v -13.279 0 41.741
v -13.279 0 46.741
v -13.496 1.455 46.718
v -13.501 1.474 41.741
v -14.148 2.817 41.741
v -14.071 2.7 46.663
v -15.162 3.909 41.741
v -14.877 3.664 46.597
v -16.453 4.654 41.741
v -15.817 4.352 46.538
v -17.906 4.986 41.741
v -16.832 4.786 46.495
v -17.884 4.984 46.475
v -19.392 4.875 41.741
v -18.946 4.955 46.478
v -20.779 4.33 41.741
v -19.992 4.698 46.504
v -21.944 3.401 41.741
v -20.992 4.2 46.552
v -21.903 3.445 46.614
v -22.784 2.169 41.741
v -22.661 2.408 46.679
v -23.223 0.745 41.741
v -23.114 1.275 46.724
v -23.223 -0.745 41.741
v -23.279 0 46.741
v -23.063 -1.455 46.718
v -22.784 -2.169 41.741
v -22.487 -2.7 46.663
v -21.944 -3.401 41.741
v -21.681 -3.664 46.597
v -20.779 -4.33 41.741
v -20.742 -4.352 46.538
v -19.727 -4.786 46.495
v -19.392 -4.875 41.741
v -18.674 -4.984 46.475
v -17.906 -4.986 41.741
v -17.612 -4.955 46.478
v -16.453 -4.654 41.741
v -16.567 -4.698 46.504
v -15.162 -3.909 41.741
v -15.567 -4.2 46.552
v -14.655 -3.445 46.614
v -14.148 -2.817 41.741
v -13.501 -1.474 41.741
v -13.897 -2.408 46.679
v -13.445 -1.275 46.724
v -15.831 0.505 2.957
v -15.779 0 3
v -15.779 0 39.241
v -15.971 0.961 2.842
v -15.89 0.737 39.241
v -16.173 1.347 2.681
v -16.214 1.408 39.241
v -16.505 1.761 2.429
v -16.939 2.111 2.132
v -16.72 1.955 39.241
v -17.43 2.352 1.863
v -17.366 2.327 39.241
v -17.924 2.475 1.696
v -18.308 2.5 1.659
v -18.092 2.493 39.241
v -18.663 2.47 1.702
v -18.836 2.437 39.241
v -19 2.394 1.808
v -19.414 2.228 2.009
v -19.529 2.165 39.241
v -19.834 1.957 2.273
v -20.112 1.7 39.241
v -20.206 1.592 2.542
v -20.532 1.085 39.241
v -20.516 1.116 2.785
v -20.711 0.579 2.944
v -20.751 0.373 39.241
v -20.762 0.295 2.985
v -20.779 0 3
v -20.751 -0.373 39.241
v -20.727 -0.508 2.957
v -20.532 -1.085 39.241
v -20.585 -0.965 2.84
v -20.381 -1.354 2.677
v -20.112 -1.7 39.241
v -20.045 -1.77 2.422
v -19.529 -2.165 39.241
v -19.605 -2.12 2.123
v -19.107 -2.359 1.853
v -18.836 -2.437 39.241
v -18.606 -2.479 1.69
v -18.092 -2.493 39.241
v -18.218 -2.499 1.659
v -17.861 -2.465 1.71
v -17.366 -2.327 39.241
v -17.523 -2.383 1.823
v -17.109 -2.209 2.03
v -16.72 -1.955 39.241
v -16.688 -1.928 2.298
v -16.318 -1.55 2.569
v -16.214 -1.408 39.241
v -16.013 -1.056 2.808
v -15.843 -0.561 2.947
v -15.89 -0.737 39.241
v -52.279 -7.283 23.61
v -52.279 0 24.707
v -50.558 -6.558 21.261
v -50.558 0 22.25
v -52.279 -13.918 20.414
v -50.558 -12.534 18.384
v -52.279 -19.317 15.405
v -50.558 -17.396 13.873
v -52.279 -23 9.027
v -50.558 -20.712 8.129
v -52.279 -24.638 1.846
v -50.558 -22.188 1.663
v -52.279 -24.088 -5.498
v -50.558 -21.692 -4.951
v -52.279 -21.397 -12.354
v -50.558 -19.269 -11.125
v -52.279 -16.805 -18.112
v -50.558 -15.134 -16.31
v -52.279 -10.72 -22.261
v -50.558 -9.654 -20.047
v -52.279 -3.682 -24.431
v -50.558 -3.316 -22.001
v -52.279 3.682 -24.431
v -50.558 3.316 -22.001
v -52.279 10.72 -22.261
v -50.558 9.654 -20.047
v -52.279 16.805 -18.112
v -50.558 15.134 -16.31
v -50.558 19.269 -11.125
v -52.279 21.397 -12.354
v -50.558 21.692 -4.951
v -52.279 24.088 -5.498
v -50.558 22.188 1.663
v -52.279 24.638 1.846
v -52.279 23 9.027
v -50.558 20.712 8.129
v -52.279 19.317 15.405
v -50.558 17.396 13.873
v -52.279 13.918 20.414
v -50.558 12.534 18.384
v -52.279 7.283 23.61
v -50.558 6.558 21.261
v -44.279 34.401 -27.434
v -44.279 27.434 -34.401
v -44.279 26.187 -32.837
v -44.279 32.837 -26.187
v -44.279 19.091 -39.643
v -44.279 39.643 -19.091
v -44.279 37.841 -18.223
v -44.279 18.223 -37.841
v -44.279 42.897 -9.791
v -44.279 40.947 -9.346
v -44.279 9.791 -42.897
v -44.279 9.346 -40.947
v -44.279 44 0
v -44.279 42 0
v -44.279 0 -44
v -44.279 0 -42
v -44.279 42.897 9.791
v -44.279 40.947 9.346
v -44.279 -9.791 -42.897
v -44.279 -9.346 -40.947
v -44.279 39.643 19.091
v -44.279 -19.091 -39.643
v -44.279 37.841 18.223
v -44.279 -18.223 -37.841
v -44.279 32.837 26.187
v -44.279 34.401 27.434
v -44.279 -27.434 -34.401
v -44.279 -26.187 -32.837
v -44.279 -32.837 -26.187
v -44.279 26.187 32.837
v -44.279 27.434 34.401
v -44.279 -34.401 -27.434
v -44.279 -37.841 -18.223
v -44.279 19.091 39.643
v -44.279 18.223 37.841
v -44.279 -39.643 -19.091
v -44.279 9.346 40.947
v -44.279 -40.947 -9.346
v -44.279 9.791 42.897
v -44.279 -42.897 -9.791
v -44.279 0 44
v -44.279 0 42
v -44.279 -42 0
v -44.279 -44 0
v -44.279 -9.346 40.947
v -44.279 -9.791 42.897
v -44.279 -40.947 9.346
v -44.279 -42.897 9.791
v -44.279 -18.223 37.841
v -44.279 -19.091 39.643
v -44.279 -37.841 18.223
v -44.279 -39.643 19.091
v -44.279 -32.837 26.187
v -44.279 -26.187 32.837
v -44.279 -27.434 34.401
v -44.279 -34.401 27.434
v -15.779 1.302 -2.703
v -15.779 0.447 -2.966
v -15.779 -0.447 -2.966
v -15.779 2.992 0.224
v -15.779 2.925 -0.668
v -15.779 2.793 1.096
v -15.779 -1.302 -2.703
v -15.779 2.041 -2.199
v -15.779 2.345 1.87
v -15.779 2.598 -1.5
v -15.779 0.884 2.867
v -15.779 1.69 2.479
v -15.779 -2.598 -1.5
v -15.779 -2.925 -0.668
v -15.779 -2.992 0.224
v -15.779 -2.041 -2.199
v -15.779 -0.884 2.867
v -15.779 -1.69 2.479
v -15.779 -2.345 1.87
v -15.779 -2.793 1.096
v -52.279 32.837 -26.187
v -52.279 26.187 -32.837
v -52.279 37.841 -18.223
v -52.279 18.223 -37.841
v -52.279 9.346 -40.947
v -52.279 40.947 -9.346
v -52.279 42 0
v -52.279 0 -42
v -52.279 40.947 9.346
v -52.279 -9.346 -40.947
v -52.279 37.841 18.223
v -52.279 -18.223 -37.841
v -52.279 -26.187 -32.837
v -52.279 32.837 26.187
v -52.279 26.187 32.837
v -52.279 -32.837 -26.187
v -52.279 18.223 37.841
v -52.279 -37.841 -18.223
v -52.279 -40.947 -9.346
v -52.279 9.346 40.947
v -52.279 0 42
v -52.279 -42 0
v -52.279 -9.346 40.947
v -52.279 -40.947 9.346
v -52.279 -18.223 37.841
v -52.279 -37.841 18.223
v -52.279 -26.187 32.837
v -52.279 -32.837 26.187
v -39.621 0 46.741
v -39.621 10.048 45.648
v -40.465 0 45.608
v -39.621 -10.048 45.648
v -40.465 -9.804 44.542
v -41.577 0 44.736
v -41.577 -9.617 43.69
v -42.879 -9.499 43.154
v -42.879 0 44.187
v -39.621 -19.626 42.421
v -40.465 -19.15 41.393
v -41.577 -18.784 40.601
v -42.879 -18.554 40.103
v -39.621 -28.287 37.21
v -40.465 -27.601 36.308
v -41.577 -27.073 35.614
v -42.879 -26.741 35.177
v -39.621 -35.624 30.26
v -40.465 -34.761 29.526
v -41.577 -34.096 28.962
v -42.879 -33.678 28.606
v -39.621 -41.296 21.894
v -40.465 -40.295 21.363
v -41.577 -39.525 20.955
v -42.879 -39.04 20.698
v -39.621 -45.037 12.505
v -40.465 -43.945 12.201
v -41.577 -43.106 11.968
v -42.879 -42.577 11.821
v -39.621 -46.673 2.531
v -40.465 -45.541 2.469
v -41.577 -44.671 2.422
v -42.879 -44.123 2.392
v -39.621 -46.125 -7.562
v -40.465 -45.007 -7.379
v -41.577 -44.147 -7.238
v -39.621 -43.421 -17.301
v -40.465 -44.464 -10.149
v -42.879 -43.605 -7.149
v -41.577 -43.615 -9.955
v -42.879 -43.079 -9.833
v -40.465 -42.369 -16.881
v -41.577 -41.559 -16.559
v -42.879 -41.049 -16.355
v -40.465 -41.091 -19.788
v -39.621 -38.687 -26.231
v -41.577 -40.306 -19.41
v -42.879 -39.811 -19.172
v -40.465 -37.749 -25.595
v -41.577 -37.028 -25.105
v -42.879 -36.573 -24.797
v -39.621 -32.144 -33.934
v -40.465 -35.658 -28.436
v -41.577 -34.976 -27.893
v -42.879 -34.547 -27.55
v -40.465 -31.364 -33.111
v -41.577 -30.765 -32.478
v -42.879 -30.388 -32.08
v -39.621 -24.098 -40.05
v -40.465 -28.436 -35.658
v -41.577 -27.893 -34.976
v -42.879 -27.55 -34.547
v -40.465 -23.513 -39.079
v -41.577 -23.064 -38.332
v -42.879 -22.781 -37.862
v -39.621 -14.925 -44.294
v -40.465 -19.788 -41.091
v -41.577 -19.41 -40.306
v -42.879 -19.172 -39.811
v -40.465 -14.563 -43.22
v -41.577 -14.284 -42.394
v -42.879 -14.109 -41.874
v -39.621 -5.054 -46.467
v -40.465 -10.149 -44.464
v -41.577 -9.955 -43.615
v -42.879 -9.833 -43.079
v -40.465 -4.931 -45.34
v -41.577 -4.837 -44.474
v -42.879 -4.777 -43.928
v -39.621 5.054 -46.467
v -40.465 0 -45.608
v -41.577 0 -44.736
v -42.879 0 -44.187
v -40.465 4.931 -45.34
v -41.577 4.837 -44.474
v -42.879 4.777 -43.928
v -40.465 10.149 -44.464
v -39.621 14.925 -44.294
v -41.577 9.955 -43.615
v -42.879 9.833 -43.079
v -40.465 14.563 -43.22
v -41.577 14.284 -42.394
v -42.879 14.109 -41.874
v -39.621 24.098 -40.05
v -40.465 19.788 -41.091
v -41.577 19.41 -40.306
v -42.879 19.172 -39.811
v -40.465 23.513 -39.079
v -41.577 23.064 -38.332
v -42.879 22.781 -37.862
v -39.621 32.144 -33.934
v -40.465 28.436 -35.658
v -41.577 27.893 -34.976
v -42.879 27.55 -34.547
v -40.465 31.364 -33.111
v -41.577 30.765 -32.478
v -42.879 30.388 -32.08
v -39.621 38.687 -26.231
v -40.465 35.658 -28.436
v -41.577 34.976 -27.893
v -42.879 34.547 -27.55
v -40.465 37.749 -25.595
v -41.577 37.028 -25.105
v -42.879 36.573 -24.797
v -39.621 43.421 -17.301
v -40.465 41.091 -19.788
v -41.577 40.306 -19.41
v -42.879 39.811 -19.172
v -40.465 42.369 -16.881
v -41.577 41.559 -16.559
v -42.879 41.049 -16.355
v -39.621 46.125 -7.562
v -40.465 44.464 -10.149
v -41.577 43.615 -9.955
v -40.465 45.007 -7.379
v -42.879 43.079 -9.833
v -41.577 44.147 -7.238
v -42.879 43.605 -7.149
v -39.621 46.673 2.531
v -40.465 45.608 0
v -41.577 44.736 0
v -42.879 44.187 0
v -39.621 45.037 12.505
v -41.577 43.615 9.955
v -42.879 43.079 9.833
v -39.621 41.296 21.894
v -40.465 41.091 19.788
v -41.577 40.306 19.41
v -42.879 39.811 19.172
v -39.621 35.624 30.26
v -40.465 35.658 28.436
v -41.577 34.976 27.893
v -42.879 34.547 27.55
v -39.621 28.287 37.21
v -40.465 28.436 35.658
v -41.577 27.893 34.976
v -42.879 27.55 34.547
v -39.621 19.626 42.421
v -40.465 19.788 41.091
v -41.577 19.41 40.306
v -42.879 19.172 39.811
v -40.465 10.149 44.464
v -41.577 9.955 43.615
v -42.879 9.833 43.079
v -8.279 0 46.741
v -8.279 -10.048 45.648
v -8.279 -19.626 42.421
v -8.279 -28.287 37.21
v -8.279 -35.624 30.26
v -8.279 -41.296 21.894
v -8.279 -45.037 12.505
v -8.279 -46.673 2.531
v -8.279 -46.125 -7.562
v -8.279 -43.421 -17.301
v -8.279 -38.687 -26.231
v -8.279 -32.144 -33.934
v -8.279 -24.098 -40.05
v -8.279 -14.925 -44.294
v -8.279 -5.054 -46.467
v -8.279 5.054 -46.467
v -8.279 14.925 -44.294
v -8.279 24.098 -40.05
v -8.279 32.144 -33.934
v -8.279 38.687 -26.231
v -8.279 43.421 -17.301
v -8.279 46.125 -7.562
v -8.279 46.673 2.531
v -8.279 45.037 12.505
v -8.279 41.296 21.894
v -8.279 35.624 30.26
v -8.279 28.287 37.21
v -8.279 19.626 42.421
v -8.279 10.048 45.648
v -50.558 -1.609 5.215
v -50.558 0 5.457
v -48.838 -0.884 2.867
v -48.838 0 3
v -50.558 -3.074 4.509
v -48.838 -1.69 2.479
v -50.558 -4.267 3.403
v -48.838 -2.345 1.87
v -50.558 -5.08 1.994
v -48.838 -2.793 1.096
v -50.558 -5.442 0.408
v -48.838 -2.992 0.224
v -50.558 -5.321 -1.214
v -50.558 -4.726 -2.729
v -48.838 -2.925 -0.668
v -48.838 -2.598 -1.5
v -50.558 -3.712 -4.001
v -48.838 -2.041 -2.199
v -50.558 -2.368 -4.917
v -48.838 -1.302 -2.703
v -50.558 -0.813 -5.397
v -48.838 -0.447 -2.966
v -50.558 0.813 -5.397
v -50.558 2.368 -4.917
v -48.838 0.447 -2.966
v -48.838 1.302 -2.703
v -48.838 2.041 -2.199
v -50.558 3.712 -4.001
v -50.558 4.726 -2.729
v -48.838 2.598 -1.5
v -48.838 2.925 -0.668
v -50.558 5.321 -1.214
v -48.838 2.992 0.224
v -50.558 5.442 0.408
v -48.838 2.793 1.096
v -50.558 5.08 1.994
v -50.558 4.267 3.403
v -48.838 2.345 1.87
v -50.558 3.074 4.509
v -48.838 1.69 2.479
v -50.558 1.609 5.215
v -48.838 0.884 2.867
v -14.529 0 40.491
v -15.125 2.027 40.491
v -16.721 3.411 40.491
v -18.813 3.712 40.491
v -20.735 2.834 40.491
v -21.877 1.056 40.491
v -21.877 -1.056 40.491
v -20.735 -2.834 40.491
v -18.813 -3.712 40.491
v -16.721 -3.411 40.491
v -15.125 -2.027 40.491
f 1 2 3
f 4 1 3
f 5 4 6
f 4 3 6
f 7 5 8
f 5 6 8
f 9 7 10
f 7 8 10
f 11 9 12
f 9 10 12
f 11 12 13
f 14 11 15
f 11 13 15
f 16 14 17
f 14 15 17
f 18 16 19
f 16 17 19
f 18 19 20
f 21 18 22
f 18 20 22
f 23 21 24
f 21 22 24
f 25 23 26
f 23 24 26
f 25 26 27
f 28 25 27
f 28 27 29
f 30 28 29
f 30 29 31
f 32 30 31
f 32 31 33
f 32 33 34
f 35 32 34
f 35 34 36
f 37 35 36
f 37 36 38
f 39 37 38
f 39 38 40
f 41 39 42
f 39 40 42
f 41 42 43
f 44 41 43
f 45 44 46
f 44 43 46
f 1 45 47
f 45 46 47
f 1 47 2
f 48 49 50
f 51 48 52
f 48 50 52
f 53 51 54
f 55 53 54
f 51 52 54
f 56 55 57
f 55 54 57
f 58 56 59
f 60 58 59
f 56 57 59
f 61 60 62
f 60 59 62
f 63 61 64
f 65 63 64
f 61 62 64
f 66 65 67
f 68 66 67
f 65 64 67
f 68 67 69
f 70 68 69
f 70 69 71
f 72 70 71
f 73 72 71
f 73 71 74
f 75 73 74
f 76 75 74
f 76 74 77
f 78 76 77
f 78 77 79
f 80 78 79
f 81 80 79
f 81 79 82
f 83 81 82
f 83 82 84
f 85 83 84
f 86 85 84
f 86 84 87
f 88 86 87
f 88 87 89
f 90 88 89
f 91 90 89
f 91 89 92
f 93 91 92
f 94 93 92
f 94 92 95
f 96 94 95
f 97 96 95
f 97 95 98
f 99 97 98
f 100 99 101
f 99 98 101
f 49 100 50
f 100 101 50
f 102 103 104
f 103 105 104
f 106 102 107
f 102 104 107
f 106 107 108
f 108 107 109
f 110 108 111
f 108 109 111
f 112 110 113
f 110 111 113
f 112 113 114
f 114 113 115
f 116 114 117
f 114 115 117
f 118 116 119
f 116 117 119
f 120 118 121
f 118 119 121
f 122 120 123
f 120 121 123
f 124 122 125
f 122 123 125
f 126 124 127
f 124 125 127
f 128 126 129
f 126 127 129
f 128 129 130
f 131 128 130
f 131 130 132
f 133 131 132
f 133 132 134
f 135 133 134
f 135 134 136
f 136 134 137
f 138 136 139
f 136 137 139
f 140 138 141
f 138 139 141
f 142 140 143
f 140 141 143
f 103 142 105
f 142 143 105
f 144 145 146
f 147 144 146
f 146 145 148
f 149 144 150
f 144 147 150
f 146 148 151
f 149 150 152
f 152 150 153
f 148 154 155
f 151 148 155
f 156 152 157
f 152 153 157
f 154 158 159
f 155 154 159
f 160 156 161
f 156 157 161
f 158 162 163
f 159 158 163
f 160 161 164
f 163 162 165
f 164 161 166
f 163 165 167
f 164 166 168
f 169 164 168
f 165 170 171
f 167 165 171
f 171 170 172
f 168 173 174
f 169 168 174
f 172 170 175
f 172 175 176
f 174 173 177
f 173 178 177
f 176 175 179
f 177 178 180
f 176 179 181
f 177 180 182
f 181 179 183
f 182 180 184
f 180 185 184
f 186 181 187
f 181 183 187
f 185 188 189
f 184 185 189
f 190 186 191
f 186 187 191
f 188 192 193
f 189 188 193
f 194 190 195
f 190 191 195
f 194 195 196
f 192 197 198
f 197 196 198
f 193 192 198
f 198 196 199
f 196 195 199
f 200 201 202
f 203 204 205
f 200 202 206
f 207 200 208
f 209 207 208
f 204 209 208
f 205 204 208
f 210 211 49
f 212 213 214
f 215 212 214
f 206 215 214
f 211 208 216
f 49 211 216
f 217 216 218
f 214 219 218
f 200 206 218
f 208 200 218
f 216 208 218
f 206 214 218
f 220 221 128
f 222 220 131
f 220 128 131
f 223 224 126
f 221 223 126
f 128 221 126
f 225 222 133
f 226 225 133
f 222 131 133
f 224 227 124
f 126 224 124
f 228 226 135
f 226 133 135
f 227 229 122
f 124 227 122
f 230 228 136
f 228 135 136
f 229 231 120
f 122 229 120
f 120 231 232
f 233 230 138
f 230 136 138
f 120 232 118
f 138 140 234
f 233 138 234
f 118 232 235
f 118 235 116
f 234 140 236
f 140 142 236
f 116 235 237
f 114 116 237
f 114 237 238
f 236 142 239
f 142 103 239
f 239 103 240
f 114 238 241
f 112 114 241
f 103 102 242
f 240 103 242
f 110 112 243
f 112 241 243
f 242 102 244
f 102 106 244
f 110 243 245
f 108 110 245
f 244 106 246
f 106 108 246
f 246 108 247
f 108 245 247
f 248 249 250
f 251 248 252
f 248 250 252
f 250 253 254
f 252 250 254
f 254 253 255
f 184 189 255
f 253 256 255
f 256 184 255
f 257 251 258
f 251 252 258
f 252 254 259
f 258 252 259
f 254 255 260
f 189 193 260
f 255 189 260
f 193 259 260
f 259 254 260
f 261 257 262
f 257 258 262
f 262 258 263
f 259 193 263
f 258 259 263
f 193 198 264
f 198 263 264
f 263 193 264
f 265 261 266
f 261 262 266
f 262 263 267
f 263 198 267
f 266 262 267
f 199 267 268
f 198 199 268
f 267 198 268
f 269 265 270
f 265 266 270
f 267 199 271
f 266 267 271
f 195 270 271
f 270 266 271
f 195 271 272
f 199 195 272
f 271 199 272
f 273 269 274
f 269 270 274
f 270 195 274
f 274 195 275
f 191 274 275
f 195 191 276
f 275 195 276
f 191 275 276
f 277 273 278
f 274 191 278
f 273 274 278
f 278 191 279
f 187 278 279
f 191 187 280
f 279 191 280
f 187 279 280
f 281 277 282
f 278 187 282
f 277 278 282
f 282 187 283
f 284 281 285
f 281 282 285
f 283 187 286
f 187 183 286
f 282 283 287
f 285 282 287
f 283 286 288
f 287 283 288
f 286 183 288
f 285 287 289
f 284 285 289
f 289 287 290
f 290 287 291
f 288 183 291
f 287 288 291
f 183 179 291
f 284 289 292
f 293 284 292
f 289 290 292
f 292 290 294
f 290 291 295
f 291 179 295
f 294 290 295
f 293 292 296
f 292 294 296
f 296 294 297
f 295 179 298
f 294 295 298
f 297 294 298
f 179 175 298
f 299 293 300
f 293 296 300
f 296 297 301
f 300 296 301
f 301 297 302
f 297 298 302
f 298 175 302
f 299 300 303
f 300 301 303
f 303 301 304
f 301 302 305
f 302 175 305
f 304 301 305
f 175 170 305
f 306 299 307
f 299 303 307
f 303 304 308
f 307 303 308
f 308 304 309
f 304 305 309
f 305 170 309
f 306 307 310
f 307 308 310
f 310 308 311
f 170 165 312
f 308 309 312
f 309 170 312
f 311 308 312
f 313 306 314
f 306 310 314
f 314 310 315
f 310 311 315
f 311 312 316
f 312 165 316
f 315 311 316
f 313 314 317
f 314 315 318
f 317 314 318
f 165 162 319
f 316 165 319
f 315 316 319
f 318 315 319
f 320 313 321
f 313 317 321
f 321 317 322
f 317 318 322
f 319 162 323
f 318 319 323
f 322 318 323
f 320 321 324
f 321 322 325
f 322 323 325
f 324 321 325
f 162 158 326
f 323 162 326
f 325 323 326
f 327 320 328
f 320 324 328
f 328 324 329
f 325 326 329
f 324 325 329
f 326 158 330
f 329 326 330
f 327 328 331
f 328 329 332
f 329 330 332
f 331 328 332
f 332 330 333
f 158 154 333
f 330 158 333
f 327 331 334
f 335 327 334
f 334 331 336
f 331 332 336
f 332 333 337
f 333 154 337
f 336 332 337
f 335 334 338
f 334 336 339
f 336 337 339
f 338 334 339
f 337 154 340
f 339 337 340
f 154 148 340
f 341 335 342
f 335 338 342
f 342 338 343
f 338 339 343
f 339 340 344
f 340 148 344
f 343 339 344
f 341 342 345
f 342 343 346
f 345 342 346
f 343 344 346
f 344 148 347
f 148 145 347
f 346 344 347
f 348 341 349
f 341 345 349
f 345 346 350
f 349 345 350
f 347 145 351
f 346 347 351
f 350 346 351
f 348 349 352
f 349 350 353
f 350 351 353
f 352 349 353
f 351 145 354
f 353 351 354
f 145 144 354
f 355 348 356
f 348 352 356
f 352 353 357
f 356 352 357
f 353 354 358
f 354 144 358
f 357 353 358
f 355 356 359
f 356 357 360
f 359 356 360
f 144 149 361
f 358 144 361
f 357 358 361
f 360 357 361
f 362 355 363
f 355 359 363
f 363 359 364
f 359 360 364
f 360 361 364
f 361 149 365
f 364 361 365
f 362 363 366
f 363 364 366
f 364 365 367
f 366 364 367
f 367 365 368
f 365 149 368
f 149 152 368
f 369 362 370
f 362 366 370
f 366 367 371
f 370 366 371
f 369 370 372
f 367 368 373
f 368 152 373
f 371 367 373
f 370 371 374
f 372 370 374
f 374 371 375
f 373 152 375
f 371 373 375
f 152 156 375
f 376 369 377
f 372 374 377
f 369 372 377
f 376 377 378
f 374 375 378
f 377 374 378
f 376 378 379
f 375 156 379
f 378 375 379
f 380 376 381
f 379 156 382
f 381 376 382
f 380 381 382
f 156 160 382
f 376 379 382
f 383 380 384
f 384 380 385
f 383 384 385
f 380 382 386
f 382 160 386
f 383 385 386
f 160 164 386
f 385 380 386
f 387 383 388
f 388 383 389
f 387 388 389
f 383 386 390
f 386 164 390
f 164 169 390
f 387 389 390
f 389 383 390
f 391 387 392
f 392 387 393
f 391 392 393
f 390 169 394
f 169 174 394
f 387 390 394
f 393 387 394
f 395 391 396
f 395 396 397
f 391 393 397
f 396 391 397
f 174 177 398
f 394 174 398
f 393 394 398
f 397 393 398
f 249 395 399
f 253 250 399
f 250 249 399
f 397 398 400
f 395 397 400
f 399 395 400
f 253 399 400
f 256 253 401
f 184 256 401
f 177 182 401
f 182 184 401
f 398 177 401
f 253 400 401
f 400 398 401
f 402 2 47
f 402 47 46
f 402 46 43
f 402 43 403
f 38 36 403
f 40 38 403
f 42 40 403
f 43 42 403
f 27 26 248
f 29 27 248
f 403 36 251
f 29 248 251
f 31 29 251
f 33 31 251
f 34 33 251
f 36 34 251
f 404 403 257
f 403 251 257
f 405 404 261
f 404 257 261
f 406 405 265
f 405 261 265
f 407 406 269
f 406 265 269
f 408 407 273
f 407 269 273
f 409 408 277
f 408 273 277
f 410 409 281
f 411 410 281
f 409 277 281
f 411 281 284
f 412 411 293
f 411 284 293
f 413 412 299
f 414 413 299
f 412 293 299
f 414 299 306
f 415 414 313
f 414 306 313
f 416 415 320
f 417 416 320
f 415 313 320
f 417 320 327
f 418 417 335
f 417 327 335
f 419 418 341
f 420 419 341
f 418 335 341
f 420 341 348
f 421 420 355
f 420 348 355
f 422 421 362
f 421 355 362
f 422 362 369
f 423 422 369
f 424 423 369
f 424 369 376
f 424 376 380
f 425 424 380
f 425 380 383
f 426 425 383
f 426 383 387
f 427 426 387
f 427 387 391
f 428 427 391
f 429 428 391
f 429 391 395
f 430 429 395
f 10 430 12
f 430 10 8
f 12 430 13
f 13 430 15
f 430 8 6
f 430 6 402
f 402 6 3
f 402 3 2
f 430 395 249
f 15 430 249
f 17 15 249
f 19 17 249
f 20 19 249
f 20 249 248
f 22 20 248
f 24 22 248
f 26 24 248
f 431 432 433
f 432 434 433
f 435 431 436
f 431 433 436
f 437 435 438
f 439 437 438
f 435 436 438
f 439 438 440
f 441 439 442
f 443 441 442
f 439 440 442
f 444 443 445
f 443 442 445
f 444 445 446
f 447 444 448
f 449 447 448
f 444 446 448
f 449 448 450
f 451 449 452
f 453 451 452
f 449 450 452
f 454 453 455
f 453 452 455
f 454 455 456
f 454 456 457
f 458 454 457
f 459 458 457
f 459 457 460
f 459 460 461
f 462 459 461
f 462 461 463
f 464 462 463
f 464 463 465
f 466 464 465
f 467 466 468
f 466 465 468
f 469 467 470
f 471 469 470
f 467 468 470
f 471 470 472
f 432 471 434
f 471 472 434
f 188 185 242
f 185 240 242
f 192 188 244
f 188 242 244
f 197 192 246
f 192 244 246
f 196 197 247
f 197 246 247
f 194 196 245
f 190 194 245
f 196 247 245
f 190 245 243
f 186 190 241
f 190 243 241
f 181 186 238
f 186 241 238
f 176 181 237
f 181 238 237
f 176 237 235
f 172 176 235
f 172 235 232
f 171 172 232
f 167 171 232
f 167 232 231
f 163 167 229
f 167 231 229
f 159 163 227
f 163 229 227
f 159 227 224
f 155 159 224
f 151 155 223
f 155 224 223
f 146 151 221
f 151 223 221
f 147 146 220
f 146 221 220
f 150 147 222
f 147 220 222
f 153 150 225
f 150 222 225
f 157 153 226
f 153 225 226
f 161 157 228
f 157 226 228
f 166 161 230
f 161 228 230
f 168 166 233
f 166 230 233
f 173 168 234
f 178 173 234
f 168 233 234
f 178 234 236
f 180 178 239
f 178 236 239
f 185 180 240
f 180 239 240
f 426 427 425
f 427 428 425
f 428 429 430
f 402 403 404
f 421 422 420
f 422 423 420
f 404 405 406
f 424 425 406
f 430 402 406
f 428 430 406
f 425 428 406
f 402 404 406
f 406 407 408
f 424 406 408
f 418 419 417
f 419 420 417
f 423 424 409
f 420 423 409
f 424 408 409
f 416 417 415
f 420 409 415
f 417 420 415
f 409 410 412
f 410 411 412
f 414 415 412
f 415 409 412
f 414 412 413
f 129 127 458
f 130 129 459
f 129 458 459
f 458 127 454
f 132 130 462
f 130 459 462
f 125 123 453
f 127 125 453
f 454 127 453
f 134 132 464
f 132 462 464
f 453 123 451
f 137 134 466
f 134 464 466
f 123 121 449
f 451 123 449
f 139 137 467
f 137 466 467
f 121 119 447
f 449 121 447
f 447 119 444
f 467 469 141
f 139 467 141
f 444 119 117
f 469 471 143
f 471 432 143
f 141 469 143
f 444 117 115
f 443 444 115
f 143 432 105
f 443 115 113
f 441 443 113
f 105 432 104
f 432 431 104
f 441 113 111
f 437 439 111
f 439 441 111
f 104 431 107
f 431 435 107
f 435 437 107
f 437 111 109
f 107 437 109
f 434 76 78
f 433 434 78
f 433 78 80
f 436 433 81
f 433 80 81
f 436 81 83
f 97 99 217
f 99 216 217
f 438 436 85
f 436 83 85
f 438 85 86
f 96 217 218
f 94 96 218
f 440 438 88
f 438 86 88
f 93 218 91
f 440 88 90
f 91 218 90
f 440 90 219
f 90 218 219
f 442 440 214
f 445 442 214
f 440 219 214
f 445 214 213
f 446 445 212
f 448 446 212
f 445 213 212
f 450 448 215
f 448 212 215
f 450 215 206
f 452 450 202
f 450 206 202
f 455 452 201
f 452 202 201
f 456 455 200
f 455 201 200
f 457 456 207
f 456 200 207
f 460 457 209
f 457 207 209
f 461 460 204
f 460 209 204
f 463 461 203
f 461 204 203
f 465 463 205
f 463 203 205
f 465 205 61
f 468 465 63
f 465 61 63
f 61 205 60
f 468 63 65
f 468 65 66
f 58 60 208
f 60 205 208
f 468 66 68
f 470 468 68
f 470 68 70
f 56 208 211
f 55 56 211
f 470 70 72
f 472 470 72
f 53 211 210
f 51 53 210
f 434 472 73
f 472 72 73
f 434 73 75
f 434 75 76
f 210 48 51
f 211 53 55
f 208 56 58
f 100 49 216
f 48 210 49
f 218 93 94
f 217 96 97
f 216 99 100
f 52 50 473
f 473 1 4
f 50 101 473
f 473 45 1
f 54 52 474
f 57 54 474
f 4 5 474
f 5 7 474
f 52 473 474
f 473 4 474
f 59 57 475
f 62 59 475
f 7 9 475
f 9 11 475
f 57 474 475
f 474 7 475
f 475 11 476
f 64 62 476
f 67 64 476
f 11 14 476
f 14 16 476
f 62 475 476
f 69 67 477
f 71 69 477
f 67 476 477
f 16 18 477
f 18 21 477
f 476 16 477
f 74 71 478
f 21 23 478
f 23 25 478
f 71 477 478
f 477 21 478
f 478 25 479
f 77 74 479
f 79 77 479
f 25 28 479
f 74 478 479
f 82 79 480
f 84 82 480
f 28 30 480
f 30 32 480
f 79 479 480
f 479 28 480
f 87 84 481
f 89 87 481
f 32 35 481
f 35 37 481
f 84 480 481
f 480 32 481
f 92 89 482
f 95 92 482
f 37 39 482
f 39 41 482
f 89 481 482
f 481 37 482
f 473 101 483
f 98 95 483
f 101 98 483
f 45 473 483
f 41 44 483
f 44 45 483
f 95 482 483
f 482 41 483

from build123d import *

# Parameters (mm, degrees)
CUT_EXTRUDE8_REACH      = 118.862
CUT_EXTRUDE8_END_RADIUS = 3
SKETCH2_R               = 2.5
SKETCH9_R               = 5
CUT_EXTRUDE9_DEPTH      = 5
CHAMFER1_SIZE           = 2.5


with BuildPart() as part:
    # Sketch1 → Revolve1 (revolve)
    with BuildSketch(Plane.XY, mode=Mode.PRIVATE) as revolve1_sk:
        with BuildLine():
            Line((-28.837765837, -3), (-15.779224455, -3))
            Line((-15.779224455, -3), (-15.779224455, 0))
            Line((-15.779224455, 0), (-8.279224455, 0))
            Line((-8.279224455, 0), (-8.279224455, -46.741129743))
            Line((-8.279224455, -46.741129743), (-39.621237636, -46.741129743))
            ThreePointArc((-39.621237636, -46.741129743), (-41.576881329, -44.736133736), (-44.279224455, -44))
            Line((-44.279224455, -44), (-44.279224455, -42))
            Line((-44.279224455, -42), (-52.279224455, -42))
            Line((-52.279224455, -42), (-52.279224455, -30))
            Line((-52.279224455, -30), (-52.279224455, -24.707456133))
            Line((-52.279224455, -24.707456133), (-50.558495146, -22.25))
            Line((-50.558495146, -22.25), (-50.558495146, -5.457456133))
            Line((-50.558495146, -5.457456133), (-48.837765837, -3))
            Line((-48.837765837, -3), (-28.837765837, -3))
        make_face()
    revolve(revolve1_sk.sketch.rotate(Axis((-82.123840877, 0, 0), (1, 0, 0)), 270), axis=Axis((-82.123840877, 0, 0), (1, 0, 0)))

    # Cut-Extrude8: up to this cylinder (the profile starts outside it)
    cut_extrude8_end = Plane(origin=(-18.279224, 0, 0), z_dir=(-1, 0, 0)) * Cylinder(CUT_EXTRUDE8_END_RADIUS, 244.724, mode=Mode.PRIVATE)
    # Sketch2 → Cut-Extrude8 (cut, up to the surface)
    with BuildSketch(Plane.XY.offset(46.741129743), mode=Mode.PRIVATE) as cut_extrude8_sk1:
        with Locations((-18.279224455, 0)):
            Circle(SKETCH2_R)
    cut_extrude8_tool1 = extrude(cut_extrude8_sk1.sketch, amount=-CUT_EXTRUDE8_REACH, mode=Mode.PRIVATE) - cut_extrude8_end
    add(cut_extrude8_tool1.solids().sort_by_distance((-18.279224, 0, 46.74113))[0], mode=Mode.SUBTRACT)

    # Sketch9 → Cut-Extrude9 (cut)
    with BuildSketch(Plane.XY.offset(46.741129743)):
        with Locations((-18.279224455, 0)):
            Circle(SKETCH9_R)
    extrude(amount=-CUT_EXTRUDE9_DEPTH, mode=Mode.SUBTRACT)

    # Chamfer1
    chamfer1_edges = [part.edges().sort_by_distance(p)[0] for p in [
        (-20.779224455, 0, 41.741129743),
    ]]
    chamfer(chamfer1_edges, length=CHAMFER1_SIZE - 0.0001)  # a hair under: the kernel refuses the full size


solid = part.part
